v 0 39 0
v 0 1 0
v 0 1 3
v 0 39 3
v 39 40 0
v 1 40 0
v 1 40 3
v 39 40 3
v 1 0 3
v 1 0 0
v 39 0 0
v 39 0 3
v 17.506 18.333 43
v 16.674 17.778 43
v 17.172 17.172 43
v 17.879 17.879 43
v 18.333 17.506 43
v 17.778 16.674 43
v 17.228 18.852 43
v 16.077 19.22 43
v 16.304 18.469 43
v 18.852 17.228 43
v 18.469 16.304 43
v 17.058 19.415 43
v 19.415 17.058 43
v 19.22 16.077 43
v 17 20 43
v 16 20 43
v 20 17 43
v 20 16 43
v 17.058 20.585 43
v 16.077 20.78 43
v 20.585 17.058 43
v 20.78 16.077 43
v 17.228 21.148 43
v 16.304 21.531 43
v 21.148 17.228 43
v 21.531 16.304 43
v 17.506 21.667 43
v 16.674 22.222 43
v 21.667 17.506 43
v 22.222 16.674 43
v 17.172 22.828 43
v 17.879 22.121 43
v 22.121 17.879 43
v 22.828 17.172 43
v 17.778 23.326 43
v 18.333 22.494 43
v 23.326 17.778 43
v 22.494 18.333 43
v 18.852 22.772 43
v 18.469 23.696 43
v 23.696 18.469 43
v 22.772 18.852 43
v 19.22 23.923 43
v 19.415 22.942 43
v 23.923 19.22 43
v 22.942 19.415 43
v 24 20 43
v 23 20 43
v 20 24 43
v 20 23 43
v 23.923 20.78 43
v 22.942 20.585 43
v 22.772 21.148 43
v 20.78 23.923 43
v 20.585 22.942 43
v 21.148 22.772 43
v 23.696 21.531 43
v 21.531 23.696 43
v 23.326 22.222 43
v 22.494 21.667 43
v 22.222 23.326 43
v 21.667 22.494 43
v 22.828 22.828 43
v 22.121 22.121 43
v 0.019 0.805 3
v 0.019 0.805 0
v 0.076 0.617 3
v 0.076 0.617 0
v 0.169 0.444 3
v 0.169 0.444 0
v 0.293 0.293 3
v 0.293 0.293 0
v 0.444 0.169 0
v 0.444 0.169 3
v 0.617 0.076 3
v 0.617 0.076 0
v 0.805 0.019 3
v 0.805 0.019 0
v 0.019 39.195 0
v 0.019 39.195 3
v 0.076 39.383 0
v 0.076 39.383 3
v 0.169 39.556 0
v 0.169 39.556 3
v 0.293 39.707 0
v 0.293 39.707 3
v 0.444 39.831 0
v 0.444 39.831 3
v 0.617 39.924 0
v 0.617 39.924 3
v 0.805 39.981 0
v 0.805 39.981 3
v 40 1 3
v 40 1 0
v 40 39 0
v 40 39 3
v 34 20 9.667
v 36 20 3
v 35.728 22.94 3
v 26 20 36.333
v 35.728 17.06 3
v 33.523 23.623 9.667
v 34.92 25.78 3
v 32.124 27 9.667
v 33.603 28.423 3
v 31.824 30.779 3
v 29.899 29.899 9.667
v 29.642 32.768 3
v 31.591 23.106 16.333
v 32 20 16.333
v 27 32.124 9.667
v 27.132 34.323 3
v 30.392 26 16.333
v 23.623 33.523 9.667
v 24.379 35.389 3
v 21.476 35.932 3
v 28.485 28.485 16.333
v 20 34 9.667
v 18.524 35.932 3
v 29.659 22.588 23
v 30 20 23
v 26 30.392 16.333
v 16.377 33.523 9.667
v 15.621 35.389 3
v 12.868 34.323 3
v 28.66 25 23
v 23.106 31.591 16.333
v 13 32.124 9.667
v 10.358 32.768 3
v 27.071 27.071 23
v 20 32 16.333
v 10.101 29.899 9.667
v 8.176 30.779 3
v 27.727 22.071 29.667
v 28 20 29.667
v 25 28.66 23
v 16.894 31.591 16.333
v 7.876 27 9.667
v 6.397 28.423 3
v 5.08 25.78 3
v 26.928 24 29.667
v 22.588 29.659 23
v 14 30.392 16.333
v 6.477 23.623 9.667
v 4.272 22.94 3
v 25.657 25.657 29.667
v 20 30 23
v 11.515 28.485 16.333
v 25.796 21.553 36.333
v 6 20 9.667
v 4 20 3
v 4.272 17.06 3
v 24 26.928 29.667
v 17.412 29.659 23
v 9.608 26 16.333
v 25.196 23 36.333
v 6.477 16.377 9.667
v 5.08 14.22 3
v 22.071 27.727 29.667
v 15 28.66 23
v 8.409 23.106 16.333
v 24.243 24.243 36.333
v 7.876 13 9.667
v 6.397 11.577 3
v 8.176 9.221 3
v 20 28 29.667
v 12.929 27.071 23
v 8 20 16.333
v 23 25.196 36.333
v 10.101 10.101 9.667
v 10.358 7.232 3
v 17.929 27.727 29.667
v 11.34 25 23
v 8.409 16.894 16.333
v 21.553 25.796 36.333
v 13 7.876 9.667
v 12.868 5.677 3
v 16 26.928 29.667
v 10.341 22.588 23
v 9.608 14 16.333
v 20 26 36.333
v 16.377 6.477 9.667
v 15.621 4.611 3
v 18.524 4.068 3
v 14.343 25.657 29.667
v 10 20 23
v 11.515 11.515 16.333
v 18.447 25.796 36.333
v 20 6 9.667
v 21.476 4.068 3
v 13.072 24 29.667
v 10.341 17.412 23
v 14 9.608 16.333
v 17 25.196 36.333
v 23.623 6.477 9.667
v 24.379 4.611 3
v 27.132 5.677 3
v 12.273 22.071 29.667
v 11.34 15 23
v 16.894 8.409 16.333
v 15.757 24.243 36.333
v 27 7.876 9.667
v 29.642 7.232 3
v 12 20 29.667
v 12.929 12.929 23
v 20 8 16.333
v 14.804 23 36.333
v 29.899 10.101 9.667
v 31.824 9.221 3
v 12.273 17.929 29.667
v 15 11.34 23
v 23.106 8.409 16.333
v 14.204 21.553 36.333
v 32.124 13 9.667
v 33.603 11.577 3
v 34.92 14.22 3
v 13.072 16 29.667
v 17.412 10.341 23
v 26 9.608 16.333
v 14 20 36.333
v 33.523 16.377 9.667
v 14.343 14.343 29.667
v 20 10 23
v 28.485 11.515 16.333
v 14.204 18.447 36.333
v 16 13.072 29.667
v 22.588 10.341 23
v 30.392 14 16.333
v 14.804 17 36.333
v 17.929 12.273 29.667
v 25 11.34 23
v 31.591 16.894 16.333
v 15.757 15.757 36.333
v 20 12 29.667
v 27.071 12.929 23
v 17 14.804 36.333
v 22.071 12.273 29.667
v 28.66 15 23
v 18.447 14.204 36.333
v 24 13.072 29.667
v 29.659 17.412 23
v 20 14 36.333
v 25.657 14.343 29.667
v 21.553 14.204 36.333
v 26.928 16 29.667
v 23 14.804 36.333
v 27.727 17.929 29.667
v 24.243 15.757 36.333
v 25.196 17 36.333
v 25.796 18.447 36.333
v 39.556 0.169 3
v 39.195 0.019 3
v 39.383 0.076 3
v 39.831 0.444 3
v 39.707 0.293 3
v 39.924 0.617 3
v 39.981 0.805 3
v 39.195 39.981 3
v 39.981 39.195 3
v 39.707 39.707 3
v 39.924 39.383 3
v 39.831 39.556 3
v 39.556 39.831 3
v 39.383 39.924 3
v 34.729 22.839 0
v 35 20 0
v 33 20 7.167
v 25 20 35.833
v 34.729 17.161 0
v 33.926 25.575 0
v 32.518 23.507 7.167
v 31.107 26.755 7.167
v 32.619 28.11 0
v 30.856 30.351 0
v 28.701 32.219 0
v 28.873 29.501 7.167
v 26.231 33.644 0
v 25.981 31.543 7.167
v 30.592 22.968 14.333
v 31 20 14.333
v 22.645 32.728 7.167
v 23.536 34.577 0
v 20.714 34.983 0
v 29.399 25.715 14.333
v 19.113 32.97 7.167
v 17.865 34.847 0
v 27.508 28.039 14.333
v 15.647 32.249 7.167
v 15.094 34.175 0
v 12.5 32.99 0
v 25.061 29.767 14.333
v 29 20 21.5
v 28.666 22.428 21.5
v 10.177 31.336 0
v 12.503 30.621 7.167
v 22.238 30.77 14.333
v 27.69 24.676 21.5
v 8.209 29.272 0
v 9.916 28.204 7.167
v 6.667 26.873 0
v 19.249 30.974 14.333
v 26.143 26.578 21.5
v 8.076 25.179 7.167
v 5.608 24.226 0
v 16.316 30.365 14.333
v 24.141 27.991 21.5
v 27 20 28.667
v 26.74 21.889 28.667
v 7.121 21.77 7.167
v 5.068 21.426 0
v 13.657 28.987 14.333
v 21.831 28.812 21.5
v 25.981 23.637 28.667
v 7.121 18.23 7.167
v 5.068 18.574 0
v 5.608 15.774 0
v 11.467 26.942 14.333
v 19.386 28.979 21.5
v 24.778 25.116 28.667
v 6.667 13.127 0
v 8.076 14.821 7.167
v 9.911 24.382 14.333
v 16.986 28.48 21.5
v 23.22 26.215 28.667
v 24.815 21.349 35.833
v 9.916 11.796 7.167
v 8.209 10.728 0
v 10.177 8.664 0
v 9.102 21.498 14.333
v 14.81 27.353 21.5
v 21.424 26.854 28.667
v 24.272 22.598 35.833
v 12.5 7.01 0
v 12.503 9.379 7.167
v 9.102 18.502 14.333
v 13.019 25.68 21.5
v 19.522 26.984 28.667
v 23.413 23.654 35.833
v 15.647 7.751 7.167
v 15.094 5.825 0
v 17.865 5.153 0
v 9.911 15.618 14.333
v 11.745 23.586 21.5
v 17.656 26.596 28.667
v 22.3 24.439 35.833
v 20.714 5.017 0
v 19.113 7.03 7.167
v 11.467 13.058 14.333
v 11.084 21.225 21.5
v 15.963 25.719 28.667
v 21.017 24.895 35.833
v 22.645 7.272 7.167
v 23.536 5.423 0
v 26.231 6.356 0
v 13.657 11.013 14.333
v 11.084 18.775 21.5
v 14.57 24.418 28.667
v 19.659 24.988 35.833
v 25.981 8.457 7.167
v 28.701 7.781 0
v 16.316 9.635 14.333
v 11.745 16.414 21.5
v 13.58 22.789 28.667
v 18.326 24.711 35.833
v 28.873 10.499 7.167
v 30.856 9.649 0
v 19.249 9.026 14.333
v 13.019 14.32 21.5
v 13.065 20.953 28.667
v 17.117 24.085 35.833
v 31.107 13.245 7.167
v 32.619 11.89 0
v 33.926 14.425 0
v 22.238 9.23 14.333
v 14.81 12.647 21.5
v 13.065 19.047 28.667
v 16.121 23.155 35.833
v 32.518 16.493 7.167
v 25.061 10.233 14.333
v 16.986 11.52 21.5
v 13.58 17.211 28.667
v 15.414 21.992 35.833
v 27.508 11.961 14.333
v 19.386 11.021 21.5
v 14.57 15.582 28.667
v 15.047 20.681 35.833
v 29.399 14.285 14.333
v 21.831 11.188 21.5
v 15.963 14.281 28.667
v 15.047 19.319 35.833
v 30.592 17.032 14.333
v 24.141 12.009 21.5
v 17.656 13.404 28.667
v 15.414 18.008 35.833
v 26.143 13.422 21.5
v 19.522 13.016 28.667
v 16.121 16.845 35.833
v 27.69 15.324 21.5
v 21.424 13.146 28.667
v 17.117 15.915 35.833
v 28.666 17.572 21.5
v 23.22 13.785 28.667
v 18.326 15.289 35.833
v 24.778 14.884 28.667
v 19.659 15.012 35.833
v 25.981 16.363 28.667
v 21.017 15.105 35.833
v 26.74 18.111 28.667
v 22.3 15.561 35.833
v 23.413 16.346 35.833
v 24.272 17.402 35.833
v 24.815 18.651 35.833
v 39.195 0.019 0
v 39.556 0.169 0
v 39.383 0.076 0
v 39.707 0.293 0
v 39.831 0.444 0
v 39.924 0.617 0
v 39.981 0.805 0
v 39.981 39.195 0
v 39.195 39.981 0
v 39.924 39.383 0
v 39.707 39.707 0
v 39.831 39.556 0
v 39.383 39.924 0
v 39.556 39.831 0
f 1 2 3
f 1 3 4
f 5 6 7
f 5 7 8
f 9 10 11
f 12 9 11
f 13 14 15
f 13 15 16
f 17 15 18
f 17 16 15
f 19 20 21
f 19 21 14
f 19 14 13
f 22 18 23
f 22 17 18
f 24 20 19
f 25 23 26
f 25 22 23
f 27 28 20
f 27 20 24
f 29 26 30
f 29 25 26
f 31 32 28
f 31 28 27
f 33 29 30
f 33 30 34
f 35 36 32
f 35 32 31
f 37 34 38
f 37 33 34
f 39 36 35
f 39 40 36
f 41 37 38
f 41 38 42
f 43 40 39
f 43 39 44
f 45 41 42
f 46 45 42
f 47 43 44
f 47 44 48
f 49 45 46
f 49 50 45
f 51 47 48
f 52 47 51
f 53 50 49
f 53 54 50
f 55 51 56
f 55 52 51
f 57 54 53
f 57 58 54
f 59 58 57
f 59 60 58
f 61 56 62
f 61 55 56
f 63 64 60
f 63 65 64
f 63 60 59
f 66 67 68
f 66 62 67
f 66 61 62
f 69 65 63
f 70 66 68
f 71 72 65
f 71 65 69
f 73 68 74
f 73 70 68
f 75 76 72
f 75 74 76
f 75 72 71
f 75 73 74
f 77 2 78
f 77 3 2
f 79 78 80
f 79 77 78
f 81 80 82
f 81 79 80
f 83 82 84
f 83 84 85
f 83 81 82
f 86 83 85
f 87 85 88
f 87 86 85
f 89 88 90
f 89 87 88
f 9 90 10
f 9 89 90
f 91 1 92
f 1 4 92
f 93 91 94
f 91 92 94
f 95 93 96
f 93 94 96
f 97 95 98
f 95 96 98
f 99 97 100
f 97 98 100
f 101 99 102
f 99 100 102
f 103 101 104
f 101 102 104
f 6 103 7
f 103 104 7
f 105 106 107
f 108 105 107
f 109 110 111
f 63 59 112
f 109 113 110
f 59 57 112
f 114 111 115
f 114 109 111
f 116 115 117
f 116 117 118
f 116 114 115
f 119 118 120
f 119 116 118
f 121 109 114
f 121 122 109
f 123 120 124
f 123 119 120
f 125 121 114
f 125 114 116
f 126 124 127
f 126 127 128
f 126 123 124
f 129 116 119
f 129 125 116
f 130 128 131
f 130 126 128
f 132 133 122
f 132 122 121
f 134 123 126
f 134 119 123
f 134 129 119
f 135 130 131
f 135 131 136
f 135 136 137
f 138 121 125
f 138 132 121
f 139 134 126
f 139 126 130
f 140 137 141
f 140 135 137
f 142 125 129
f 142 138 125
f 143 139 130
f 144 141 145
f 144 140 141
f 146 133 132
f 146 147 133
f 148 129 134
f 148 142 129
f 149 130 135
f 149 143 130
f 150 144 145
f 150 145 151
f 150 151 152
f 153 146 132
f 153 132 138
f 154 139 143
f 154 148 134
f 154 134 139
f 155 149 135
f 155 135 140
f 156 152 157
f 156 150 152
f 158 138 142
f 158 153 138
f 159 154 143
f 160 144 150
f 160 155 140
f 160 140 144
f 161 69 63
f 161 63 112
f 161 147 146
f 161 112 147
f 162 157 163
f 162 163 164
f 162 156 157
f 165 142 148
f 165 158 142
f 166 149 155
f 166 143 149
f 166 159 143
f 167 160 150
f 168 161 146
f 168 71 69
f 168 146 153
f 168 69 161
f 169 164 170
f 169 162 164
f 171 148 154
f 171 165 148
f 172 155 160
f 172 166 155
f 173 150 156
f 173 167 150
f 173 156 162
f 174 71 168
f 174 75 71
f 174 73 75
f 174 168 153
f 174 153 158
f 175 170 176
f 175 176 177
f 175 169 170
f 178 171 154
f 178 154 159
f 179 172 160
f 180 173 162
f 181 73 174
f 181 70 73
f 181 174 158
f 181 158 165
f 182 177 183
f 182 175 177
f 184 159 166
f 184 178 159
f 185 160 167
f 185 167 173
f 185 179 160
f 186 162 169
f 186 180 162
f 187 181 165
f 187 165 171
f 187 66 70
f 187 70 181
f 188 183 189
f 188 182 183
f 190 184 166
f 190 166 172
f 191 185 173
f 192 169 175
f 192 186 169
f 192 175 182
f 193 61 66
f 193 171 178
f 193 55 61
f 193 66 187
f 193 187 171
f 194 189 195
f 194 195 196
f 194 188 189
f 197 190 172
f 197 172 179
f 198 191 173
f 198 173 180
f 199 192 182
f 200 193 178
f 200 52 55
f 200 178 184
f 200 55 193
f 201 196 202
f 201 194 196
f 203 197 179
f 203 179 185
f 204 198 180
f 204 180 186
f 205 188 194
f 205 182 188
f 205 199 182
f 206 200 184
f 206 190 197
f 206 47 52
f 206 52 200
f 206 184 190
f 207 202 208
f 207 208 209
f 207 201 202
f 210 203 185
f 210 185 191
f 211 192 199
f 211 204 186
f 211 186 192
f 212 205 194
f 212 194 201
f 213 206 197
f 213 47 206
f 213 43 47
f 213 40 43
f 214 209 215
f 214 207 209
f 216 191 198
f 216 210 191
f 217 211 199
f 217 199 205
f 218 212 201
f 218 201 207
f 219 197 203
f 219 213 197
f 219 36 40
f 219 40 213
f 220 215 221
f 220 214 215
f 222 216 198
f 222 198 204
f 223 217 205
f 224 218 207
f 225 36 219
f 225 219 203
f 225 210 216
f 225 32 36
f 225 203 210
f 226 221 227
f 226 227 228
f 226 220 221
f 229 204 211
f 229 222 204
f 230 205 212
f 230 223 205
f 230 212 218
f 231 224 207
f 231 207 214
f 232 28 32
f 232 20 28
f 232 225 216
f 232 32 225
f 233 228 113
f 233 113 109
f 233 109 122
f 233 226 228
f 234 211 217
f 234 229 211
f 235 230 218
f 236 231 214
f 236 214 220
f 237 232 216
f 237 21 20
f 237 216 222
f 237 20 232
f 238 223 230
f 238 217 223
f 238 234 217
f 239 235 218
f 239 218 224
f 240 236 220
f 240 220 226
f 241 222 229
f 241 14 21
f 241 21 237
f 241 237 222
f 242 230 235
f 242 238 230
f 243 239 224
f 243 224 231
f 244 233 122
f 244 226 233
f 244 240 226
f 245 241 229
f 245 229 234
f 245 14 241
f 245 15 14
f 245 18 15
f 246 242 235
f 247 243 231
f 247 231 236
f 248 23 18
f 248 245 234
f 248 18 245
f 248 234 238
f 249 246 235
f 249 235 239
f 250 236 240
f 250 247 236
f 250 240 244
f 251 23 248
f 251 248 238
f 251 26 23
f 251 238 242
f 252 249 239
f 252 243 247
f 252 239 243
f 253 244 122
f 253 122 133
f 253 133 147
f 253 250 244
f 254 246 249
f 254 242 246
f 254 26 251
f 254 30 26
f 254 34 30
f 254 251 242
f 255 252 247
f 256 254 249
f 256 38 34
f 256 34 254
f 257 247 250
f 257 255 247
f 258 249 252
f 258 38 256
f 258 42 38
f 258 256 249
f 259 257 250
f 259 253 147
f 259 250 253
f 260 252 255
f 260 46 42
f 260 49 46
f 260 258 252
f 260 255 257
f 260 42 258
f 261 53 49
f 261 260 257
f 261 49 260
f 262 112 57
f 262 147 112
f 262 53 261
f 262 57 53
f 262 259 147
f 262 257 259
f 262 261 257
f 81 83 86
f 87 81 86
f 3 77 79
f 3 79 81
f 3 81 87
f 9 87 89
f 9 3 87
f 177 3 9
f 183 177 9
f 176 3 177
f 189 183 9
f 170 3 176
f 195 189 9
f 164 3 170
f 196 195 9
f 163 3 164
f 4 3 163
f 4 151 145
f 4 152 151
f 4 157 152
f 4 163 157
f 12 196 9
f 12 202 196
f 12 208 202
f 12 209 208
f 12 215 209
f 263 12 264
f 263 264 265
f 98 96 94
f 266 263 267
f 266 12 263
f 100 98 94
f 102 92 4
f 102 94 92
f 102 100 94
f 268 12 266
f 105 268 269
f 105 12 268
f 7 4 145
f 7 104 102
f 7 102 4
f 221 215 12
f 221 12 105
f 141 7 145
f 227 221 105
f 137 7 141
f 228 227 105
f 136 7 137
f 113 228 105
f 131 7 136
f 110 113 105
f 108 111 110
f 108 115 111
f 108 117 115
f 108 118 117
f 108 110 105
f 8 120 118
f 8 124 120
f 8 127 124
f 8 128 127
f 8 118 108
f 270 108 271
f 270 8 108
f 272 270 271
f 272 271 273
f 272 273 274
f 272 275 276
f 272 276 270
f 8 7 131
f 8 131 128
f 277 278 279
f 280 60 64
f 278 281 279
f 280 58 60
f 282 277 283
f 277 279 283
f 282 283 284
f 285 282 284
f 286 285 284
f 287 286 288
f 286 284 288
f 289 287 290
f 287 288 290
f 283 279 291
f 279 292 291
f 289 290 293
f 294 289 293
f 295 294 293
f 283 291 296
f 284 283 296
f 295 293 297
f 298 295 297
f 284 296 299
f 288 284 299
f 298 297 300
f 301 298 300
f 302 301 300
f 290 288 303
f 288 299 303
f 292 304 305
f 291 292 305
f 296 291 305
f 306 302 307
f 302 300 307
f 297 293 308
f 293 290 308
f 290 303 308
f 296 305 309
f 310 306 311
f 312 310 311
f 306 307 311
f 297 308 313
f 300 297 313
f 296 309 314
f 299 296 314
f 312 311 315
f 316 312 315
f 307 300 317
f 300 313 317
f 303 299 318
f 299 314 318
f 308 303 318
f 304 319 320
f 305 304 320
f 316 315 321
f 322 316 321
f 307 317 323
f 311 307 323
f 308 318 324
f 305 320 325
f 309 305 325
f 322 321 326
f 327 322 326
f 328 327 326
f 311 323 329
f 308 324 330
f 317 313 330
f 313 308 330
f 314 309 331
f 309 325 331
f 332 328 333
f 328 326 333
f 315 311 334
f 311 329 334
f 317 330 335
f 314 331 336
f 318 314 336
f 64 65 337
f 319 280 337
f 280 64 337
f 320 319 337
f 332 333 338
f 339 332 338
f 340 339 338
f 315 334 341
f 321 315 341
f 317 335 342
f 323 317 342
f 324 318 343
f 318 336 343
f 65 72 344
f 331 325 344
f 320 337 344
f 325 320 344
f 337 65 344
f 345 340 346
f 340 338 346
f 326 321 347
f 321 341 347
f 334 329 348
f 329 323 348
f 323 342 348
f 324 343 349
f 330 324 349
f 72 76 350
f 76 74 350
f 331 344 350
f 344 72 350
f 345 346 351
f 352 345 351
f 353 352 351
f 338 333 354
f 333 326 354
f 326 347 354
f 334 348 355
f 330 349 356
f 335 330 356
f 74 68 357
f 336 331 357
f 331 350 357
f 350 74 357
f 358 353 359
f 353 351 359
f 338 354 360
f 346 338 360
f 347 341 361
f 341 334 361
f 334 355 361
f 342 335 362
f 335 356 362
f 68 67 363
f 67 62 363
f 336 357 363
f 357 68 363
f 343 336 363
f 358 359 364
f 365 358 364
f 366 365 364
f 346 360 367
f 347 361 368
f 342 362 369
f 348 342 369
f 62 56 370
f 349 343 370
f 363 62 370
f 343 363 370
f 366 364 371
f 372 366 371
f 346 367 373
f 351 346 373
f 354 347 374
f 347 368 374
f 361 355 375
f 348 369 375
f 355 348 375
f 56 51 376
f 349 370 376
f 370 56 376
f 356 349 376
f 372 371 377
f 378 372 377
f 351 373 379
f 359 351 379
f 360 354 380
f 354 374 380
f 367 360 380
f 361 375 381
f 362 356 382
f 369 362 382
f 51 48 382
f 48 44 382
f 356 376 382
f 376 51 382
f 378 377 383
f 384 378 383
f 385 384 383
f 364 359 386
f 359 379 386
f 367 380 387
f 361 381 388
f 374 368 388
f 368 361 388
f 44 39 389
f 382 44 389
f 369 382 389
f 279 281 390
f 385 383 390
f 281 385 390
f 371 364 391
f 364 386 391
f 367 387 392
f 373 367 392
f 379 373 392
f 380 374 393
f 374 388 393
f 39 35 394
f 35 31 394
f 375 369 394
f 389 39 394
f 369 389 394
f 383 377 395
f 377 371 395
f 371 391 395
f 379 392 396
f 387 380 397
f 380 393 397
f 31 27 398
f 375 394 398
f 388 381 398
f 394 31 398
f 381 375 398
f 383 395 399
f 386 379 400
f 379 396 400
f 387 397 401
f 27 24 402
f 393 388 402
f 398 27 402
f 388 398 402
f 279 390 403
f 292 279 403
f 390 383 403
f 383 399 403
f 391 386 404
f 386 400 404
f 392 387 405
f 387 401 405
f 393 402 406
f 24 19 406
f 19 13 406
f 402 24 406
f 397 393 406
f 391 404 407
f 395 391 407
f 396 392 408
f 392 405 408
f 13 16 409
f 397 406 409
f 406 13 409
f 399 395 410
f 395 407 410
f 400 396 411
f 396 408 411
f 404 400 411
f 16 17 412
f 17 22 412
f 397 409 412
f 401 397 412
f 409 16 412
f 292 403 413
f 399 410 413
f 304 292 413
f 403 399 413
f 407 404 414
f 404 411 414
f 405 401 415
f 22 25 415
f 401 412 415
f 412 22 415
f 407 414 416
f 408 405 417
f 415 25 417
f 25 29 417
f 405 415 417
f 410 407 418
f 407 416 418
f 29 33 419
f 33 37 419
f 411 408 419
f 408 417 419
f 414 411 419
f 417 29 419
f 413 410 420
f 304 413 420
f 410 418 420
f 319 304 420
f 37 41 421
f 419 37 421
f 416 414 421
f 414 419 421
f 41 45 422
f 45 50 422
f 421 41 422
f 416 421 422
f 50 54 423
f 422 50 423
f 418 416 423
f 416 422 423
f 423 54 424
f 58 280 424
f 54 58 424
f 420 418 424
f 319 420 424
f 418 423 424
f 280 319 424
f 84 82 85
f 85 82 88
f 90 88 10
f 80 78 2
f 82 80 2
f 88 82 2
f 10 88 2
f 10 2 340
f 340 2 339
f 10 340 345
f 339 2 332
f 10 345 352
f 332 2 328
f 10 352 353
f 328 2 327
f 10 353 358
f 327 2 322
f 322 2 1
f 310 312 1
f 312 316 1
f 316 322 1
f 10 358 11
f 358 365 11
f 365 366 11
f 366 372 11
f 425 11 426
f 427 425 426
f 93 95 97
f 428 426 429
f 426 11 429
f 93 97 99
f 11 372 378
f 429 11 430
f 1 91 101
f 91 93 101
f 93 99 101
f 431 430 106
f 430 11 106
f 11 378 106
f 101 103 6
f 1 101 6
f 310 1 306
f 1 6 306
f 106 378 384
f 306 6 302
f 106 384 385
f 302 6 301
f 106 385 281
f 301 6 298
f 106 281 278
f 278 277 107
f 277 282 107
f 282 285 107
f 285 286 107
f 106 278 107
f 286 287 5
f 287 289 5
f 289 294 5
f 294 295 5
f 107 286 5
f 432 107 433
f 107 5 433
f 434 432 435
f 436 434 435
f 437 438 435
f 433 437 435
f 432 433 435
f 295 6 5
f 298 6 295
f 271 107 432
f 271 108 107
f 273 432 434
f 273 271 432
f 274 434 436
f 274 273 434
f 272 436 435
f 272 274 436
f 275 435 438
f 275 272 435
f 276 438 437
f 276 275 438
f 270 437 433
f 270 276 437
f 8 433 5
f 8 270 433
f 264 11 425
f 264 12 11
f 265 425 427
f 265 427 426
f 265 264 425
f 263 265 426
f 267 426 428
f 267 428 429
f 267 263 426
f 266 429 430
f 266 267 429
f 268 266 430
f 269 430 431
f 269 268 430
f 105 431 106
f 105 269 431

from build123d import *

# Parameters (mm, degrees)
BOX_W     = 40
BOX_H     = 40
BOX_DEPTH = 3
FILLET_R  = 1


with BuildPart() as cone001:
    # Cone001 → Cone001 (revolve)
    with BuildSketch(Plane(origin=(20, 20, 0), x_dir=(1, 0, 0), z_dir=(0, -1, 0))):
        Polygon((0, 0), (15, 0), (3, 43), (0, 43), align=None)
    revolve(axis=Axis((20, 20, 0), (0, 0, 1)))


with BuildPart() as cut:
    # Cone → Cone (revolve)
    with BuildSketch(Plane(origin=(20, 20, 3), x_dir=(1, 0, 0), z_dir=(0, -1, 0))):
        Polygon((0, 0), (16, 0), (4, 40), (0, 40), align=None)
    revolve(axis=Axis((20, 20, 3), (0, 0, 1)))

    # Cut: cut Cone001
    add(cone001.part, mode=Mode.SUBTRACT)


with BuildPart() as cone002:
    # Cone002 → Cone002 (revolve)
    with BuildSketch(Plane(origin=(20, 20, 0), x_dir=(1, 0, 0), z_dir=(0, -1, 0))):
        Polygon((0, 0), (15, 0), (3, 43), (0, 43), align=None)
    revolve(axis=Axis((20, 20, 0), (0, 0, 1)))


with BuildPart() as fusion:
    # Box → Box (new body)
    with BuildSketch(Plane.XY):
        with Locations((20, 20)):
            Rectangle(BOX_W, BOX_H)
    extrude(amount=BOX_DEPTH)

    # Fillet
    fillet_edges = [fusion.edges().sort_by_distance(p)[0] for p in [
        (0, 0, 1.5),
        (0, 40, 1.5),
        (40, 0, 1.5),
        (40, 40, 1.5),
    ]]
    fillet(fillet_edges, radius=FILLET_R)

    # Cut001: cut Cone002
    add(cone002.part, mode=Mode.SUBTRACT)

    # Fusion: union Cut
    add(cut.part)


solid = fusion.part
